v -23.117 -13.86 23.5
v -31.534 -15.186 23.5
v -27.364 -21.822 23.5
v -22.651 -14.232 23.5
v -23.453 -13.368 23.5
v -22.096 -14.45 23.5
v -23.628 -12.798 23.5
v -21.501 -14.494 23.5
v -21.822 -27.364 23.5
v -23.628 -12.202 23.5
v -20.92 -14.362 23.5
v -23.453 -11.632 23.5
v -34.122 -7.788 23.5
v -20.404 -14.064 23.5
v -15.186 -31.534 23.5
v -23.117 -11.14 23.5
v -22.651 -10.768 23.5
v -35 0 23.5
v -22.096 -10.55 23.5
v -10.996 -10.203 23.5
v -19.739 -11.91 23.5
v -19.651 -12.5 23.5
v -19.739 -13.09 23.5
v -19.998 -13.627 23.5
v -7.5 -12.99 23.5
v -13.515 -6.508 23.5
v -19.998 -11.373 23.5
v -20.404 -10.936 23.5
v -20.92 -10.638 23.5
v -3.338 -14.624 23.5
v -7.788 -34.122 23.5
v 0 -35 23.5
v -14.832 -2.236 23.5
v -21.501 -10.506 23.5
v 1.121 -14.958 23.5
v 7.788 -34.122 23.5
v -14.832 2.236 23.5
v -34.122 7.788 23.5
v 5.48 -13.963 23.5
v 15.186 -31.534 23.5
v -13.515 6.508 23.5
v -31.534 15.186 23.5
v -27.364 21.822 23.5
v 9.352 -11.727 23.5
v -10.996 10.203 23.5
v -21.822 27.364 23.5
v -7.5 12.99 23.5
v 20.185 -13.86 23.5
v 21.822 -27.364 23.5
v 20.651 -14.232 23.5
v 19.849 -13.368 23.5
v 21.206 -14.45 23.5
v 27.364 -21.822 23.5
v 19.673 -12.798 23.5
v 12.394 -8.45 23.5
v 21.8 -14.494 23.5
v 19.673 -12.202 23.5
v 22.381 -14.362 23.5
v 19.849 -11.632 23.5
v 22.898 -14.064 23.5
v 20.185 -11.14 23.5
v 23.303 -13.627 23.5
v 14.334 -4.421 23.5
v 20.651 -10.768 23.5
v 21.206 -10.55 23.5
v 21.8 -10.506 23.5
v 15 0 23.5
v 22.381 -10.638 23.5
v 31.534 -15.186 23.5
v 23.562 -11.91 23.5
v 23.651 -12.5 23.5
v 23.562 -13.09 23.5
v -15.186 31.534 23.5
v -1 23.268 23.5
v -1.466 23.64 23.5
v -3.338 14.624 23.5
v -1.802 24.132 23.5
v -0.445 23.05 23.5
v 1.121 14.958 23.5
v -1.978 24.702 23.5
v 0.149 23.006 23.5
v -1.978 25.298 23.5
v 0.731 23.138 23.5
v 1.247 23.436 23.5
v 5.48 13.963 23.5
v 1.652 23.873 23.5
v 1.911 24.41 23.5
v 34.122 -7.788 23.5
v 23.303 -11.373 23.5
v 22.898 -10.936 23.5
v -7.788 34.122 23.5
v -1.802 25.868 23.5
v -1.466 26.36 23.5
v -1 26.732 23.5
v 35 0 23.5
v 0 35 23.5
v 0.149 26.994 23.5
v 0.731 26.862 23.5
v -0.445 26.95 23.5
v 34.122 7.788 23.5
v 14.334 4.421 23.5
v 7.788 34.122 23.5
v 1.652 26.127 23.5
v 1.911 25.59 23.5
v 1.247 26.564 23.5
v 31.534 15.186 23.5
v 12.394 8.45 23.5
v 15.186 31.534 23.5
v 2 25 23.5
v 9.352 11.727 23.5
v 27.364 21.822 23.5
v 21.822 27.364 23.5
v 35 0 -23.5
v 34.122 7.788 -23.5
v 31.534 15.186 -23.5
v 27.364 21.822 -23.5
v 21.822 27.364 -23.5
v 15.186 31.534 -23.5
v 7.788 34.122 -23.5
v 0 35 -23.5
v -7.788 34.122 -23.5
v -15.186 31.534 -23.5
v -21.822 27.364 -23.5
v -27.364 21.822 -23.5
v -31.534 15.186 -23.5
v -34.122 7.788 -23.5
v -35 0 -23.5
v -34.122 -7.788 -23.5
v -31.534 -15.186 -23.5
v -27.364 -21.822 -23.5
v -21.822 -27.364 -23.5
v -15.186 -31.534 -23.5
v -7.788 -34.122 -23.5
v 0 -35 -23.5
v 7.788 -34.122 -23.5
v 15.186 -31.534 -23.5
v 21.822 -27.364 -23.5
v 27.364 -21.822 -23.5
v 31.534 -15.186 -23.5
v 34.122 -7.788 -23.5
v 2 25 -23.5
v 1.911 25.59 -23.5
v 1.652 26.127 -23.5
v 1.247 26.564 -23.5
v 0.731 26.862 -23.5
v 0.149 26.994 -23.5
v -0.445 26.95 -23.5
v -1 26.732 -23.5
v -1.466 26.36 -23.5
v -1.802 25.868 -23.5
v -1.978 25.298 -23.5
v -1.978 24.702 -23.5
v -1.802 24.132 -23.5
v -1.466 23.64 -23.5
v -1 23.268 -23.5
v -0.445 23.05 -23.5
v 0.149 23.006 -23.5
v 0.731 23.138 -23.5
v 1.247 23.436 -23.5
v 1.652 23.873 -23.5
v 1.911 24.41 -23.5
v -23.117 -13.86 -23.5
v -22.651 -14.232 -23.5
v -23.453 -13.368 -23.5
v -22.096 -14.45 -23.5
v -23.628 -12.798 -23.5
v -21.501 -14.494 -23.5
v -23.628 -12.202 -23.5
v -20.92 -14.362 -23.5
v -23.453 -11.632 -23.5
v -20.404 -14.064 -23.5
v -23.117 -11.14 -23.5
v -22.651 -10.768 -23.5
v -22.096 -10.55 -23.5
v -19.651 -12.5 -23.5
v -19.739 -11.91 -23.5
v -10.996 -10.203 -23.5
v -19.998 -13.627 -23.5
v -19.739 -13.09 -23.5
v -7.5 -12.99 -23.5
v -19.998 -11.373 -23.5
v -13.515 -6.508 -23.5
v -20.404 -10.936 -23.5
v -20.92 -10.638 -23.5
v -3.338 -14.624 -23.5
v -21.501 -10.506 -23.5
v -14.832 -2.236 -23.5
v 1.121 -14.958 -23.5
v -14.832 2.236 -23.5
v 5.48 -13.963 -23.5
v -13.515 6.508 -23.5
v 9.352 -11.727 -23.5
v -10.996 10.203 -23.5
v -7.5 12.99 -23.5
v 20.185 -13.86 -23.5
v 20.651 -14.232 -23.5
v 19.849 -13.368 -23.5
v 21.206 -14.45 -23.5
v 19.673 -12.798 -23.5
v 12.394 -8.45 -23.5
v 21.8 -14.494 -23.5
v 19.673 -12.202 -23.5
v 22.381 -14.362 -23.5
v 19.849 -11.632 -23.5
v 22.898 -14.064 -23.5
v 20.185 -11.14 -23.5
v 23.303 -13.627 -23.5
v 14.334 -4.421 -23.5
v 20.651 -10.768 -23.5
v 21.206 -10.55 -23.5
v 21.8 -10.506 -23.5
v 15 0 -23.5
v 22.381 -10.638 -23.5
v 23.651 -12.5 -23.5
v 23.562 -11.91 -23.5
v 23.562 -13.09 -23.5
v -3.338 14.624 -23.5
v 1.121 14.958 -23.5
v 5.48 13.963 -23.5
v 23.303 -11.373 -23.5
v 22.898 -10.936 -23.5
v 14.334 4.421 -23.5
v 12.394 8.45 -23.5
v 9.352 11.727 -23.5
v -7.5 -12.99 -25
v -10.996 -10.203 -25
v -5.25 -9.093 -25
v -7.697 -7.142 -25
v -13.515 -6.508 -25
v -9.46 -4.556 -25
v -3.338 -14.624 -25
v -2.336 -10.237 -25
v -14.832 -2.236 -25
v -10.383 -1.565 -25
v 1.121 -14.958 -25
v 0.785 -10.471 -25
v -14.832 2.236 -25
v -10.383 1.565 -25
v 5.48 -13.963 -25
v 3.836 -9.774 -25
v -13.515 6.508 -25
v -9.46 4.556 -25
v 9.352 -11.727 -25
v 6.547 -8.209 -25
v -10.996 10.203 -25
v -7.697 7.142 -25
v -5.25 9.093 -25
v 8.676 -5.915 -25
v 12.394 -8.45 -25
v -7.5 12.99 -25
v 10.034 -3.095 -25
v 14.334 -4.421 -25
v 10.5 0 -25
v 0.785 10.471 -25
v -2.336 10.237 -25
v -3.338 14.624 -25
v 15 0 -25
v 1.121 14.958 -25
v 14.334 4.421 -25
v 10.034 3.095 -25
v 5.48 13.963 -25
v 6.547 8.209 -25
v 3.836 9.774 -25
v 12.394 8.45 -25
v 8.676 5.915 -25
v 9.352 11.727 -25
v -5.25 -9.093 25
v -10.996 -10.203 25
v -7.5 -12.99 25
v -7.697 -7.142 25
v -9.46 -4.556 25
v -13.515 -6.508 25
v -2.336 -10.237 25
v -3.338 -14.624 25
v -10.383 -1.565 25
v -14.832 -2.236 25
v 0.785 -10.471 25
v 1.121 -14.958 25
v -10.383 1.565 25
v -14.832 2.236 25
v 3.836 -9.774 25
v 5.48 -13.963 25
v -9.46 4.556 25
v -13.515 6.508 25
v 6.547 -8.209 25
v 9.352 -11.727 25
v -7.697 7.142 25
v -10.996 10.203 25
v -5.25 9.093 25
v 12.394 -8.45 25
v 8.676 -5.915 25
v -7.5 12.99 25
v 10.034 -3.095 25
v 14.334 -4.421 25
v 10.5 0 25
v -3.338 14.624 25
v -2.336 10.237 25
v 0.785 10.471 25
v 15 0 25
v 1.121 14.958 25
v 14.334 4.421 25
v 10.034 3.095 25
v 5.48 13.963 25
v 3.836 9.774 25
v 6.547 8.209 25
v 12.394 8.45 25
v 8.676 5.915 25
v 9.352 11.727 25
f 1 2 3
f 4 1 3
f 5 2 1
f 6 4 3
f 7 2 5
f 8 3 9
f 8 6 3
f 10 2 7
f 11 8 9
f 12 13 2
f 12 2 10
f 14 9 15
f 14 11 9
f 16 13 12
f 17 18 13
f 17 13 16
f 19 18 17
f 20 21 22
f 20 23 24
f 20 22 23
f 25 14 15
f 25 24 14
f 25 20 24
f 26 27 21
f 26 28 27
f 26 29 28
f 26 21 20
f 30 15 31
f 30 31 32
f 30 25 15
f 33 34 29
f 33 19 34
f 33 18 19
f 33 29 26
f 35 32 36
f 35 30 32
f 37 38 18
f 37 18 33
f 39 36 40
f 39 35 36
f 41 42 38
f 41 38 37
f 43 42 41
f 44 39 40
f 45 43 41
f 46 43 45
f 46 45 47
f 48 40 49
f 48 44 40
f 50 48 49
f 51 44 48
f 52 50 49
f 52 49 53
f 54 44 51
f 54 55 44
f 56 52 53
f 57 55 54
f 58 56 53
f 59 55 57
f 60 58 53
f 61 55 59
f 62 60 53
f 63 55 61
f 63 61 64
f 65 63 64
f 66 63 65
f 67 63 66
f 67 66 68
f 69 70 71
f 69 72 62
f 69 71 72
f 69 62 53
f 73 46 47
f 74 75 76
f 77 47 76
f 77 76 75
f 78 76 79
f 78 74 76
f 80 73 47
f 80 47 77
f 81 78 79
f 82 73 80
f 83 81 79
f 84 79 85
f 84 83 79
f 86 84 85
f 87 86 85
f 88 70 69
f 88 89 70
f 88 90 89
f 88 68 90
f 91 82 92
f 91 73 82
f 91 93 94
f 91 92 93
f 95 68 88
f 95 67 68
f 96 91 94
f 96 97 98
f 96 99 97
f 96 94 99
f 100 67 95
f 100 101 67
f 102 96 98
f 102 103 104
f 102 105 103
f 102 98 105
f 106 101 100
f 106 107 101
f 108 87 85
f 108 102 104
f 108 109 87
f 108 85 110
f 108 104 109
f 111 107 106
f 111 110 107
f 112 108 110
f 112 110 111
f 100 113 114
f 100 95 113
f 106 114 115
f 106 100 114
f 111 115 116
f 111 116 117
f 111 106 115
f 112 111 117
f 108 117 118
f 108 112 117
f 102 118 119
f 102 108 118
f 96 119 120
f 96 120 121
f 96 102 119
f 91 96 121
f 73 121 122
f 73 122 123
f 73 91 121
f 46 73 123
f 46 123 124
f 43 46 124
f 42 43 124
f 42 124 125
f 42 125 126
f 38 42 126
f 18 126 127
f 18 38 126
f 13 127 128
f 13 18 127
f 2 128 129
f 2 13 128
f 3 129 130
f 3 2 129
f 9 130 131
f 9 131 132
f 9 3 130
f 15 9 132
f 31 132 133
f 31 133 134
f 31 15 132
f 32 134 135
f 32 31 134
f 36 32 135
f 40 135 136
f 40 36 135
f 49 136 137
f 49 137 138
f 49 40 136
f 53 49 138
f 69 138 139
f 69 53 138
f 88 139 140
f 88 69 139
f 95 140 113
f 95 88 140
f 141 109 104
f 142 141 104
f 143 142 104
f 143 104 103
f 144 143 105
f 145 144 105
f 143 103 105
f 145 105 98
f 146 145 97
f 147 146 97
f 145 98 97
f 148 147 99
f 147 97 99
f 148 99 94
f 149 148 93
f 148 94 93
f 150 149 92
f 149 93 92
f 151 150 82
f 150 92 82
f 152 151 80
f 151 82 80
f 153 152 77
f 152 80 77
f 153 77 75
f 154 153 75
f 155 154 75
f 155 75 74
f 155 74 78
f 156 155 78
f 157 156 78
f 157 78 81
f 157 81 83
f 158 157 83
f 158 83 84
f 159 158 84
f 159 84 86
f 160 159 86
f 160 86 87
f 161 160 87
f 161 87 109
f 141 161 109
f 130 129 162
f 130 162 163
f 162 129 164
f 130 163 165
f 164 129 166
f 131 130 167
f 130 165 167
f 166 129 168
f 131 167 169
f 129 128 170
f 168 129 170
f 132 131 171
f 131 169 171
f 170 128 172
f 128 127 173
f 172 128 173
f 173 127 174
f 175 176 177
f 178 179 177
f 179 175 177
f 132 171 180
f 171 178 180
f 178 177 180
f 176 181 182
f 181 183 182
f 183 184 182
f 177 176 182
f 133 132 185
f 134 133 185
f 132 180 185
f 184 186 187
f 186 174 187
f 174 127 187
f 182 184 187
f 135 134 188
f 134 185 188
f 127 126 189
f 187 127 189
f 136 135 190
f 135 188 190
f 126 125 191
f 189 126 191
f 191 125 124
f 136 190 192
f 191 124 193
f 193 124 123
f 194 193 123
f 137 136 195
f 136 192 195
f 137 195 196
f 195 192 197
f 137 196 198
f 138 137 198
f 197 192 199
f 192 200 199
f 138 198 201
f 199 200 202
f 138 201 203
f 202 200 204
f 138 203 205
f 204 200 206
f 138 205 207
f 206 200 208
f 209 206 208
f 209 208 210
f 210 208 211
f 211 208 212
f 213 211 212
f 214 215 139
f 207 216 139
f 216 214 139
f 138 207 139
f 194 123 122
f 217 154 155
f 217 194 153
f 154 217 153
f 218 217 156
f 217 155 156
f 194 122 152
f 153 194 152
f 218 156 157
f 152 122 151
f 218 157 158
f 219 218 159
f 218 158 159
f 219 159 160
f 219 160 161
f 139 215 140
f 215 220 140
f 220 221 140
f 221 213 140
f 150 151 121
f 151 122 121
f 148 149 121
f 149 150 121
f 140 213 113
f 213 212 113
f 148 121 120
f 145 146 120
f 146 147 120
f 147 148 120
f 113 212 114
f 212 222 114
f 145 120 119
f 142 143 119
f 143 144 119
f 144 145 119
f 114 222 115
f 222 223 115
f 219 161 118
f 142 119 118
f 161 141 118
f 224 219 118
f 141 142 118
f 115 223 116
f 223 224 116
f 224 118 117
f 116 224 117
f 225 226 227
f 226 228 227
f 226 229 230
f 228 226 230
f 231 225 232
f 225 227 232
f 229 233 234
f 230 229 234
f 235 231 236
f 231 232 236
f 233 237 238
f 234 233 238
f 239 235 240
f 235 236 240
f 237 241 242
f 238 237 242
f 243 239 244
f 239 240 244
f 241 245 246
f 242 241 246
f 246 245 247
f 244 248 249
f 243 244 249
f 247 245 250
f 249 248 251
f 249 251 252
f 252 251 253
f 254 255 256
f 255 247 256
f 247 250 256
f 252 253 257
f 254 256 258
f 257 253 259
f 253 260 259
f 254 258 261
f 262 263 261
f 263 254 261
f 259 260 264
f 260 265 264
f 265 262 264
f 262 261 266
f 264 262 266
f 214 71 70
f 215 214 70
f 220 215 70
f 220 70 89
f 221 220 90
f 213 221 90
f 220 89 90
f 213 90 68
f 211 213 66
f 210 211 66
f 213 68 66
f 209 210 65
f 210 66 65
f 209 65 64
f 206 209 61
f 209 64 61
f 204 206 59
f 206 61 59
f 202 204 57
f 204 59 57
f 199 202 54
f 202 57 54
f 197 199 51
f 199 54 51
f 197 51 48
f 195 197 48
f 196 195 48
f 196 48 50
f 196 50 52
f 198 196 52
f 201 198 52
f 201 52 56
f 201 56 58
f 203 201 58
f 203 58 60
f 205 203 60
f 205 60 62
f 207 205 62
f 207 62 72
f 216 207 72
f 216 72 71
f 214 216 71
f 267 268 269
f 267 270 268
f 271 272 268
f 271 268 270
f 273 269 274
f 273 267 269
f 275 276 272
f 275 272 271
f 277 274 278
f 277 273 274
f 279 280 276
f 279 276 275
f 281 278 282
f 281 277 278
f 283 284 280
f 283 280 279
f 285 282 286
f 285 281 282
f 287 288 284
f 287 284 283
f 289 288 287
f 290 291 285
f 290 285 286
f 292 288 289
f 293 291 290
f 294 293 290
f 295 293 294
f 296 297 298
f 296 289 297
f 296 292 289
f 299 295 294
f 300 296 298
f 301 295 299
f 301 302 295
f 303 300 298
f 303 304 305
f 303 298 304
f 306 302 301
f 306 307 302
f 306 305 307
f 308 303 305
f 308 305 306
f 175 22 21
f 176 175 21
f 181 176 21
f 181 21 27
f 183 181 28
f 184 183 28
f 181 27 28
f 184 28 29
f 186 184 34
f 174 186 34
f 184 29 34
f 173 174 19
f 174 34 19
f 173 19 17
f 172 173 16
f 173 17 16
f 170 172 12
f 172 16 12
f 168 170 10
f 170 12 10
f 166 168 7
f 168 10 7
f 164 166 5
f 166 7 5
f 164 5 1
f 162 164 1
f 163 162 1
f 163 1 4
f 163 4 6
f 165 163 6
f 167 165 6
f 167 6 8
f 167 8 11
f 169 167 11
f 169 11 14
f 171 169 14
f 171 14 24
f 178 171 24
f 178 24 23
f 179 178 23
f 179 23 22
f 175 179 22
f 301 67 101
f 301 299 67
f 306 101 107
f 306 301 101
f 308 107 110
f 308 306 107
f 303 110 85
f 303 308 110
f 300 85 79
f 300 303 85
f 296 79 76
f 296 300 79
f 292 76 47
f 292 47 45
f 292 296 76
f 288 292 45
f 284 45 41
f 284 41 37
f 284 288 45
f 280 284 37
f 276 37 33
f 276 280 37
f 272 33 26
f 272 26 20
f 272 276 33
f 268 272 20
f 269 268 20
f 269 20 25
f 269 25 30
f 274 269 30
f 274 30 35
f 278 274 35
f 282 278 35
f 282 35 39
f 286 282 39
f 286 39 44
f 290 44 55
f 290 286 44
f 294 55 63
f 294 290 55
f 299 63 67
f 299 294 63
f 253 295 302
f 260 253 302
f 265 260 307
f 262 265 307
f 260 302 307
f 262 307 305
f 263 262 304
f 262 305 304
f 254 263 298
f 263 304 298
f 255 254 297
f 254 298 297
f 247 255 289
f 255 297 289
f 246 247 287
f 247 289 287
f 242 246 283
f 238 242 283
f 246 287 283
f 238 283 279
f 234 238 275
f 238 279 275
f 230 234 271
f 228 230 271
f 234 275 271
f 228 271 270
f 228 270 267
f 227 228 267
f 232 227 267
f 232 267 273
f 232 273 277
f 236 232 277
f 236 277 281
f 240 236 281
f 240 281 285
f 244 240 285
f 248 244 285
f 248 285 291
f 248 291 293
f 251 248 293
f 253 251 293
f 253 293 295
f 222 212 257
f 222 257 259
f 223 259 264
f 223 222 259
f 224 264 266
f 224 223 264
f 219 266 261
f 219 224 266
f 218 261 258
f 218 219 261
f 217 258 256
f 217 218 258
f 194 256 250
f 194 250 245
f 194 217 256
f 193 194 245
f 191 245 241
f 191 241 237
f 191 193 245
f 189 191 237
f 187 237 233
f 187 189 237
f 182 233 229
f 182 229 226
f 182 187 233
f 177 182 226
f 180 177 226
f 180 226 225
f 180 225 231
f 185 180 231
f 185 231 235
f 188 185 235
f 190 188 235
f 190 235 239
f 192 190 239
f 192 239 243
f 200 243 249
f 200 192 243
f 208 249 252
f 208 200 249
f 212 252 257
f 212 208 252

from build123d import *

# Parameters (mm, degrees)
SKETCH1_R           = 35
BOSS_EXTRUDE1_DEPTH = 23.5
SKETCH2_R           = 15
BOSS_EXTRUDE2_DEPTH = 25
CUT_EXTRUDE1_REACH  = 72.356
SKETCH3_R           = 10.5
CUT_EXTRUDE2_REACH  = 71.298
SKETCH4_R           = 2


with BuildPart() as part:
    # Sketch1 → Boss-Extrude1 (new, symmetric)
    with BuildSketch(Plane.XY):
        Circle(SKETCH1_R)
    extrude(amount=BOSS_EXTRUDE1_DEPTH, both=True)

    # Sketch2 → Boss-Extrude2 (add, symmetric)
    with BuildSketch(Plane.XY):
        Circle(SKETCH2_R)
    extrude(amount=BOSS_EXTRUDE2_DEPTH, both=True)

    # Sketch3 → Cut-Extrude1 (cut, up to next)
    with BuildSketch(Plane.XY.offset(25), mode=Mode.PRIVATE) as cut_extrude1_sk1:
        Circle(SKETCH3_R)
    cut_extrude1_tool1 = extrude(cut_extrude1_sk1.sketch, amount=-CUT_EXTRUDE1_REACH, mode=Mode.PRIVATE) & part.part
    add(cut_extrude1_tool1.solids().sort_by_distance((0, 0, 25))[0], mode=Mode.SUBTRACT)

    # Sketch4 → Cut-Extrude2 (cut, up to next)
    with BuildSketch(Plane.XY.offset(23.5), mode=Mode.PRIVATE) as cut_extrude2_sk1:
        with Locations((0, 25)):
            Circle(SKETCH4_R)
    cut_extrude2_tool1 = extrude(cut_extrude2_sk1.sketch, amount=-CUT_EXTRUDE2_REACH, mode=Mode.PRIVATE) & part.part
    # Sketch4 → Cut-Extrude2 (cut, up to next)
    with BuildSketch(Plane.XY.offset(23.5), mode=Mode.PRIVATE) as cut_extrude2_sk2:
        with Locations((21.650635095, -12.5)):
            Circle(SKETCH4_R)
    cut_extrude2_tool2 = extrude(cut_extrude2_sk2.sketch, amount=-CUT_EXTRUDE2_REACH, mode=Mode.PRIVATE) & part.part
    # Sketch4 → Cut-Extrude2 (cut, up to next)
    with BuildSketch(Plane.XY.offset(23.5), mode=Mode.PRIVATE) as cut_extrude2_sk3:
        with Locations((-21.650635095, -12.5)):
            Circle(SKETCH4_R)
    cut_extrude2_tool3 = extrude(cut_extrude2_sk3.sketch, amount=-CUT_EXTRUDE2_REACH, mode=Mode.PRIVATE) & part.part
    add(cut_extrude2_tool1.solids().sort_by_distance((0, 25, 23.5))[0], mode=Mode.SUBTRACT)
    add(cut_extrude2_tool2.solids().sort_by_distance((21.650635, -12.5, 23.5))[0], mode=Mode.SUBTRACT)
    add(cut_extrude2_tool3.solids().sort_by_distance((-21.650635, -12.5, 23.5))[0], mode=Mode.SUBTRACT)


solid = part.part
